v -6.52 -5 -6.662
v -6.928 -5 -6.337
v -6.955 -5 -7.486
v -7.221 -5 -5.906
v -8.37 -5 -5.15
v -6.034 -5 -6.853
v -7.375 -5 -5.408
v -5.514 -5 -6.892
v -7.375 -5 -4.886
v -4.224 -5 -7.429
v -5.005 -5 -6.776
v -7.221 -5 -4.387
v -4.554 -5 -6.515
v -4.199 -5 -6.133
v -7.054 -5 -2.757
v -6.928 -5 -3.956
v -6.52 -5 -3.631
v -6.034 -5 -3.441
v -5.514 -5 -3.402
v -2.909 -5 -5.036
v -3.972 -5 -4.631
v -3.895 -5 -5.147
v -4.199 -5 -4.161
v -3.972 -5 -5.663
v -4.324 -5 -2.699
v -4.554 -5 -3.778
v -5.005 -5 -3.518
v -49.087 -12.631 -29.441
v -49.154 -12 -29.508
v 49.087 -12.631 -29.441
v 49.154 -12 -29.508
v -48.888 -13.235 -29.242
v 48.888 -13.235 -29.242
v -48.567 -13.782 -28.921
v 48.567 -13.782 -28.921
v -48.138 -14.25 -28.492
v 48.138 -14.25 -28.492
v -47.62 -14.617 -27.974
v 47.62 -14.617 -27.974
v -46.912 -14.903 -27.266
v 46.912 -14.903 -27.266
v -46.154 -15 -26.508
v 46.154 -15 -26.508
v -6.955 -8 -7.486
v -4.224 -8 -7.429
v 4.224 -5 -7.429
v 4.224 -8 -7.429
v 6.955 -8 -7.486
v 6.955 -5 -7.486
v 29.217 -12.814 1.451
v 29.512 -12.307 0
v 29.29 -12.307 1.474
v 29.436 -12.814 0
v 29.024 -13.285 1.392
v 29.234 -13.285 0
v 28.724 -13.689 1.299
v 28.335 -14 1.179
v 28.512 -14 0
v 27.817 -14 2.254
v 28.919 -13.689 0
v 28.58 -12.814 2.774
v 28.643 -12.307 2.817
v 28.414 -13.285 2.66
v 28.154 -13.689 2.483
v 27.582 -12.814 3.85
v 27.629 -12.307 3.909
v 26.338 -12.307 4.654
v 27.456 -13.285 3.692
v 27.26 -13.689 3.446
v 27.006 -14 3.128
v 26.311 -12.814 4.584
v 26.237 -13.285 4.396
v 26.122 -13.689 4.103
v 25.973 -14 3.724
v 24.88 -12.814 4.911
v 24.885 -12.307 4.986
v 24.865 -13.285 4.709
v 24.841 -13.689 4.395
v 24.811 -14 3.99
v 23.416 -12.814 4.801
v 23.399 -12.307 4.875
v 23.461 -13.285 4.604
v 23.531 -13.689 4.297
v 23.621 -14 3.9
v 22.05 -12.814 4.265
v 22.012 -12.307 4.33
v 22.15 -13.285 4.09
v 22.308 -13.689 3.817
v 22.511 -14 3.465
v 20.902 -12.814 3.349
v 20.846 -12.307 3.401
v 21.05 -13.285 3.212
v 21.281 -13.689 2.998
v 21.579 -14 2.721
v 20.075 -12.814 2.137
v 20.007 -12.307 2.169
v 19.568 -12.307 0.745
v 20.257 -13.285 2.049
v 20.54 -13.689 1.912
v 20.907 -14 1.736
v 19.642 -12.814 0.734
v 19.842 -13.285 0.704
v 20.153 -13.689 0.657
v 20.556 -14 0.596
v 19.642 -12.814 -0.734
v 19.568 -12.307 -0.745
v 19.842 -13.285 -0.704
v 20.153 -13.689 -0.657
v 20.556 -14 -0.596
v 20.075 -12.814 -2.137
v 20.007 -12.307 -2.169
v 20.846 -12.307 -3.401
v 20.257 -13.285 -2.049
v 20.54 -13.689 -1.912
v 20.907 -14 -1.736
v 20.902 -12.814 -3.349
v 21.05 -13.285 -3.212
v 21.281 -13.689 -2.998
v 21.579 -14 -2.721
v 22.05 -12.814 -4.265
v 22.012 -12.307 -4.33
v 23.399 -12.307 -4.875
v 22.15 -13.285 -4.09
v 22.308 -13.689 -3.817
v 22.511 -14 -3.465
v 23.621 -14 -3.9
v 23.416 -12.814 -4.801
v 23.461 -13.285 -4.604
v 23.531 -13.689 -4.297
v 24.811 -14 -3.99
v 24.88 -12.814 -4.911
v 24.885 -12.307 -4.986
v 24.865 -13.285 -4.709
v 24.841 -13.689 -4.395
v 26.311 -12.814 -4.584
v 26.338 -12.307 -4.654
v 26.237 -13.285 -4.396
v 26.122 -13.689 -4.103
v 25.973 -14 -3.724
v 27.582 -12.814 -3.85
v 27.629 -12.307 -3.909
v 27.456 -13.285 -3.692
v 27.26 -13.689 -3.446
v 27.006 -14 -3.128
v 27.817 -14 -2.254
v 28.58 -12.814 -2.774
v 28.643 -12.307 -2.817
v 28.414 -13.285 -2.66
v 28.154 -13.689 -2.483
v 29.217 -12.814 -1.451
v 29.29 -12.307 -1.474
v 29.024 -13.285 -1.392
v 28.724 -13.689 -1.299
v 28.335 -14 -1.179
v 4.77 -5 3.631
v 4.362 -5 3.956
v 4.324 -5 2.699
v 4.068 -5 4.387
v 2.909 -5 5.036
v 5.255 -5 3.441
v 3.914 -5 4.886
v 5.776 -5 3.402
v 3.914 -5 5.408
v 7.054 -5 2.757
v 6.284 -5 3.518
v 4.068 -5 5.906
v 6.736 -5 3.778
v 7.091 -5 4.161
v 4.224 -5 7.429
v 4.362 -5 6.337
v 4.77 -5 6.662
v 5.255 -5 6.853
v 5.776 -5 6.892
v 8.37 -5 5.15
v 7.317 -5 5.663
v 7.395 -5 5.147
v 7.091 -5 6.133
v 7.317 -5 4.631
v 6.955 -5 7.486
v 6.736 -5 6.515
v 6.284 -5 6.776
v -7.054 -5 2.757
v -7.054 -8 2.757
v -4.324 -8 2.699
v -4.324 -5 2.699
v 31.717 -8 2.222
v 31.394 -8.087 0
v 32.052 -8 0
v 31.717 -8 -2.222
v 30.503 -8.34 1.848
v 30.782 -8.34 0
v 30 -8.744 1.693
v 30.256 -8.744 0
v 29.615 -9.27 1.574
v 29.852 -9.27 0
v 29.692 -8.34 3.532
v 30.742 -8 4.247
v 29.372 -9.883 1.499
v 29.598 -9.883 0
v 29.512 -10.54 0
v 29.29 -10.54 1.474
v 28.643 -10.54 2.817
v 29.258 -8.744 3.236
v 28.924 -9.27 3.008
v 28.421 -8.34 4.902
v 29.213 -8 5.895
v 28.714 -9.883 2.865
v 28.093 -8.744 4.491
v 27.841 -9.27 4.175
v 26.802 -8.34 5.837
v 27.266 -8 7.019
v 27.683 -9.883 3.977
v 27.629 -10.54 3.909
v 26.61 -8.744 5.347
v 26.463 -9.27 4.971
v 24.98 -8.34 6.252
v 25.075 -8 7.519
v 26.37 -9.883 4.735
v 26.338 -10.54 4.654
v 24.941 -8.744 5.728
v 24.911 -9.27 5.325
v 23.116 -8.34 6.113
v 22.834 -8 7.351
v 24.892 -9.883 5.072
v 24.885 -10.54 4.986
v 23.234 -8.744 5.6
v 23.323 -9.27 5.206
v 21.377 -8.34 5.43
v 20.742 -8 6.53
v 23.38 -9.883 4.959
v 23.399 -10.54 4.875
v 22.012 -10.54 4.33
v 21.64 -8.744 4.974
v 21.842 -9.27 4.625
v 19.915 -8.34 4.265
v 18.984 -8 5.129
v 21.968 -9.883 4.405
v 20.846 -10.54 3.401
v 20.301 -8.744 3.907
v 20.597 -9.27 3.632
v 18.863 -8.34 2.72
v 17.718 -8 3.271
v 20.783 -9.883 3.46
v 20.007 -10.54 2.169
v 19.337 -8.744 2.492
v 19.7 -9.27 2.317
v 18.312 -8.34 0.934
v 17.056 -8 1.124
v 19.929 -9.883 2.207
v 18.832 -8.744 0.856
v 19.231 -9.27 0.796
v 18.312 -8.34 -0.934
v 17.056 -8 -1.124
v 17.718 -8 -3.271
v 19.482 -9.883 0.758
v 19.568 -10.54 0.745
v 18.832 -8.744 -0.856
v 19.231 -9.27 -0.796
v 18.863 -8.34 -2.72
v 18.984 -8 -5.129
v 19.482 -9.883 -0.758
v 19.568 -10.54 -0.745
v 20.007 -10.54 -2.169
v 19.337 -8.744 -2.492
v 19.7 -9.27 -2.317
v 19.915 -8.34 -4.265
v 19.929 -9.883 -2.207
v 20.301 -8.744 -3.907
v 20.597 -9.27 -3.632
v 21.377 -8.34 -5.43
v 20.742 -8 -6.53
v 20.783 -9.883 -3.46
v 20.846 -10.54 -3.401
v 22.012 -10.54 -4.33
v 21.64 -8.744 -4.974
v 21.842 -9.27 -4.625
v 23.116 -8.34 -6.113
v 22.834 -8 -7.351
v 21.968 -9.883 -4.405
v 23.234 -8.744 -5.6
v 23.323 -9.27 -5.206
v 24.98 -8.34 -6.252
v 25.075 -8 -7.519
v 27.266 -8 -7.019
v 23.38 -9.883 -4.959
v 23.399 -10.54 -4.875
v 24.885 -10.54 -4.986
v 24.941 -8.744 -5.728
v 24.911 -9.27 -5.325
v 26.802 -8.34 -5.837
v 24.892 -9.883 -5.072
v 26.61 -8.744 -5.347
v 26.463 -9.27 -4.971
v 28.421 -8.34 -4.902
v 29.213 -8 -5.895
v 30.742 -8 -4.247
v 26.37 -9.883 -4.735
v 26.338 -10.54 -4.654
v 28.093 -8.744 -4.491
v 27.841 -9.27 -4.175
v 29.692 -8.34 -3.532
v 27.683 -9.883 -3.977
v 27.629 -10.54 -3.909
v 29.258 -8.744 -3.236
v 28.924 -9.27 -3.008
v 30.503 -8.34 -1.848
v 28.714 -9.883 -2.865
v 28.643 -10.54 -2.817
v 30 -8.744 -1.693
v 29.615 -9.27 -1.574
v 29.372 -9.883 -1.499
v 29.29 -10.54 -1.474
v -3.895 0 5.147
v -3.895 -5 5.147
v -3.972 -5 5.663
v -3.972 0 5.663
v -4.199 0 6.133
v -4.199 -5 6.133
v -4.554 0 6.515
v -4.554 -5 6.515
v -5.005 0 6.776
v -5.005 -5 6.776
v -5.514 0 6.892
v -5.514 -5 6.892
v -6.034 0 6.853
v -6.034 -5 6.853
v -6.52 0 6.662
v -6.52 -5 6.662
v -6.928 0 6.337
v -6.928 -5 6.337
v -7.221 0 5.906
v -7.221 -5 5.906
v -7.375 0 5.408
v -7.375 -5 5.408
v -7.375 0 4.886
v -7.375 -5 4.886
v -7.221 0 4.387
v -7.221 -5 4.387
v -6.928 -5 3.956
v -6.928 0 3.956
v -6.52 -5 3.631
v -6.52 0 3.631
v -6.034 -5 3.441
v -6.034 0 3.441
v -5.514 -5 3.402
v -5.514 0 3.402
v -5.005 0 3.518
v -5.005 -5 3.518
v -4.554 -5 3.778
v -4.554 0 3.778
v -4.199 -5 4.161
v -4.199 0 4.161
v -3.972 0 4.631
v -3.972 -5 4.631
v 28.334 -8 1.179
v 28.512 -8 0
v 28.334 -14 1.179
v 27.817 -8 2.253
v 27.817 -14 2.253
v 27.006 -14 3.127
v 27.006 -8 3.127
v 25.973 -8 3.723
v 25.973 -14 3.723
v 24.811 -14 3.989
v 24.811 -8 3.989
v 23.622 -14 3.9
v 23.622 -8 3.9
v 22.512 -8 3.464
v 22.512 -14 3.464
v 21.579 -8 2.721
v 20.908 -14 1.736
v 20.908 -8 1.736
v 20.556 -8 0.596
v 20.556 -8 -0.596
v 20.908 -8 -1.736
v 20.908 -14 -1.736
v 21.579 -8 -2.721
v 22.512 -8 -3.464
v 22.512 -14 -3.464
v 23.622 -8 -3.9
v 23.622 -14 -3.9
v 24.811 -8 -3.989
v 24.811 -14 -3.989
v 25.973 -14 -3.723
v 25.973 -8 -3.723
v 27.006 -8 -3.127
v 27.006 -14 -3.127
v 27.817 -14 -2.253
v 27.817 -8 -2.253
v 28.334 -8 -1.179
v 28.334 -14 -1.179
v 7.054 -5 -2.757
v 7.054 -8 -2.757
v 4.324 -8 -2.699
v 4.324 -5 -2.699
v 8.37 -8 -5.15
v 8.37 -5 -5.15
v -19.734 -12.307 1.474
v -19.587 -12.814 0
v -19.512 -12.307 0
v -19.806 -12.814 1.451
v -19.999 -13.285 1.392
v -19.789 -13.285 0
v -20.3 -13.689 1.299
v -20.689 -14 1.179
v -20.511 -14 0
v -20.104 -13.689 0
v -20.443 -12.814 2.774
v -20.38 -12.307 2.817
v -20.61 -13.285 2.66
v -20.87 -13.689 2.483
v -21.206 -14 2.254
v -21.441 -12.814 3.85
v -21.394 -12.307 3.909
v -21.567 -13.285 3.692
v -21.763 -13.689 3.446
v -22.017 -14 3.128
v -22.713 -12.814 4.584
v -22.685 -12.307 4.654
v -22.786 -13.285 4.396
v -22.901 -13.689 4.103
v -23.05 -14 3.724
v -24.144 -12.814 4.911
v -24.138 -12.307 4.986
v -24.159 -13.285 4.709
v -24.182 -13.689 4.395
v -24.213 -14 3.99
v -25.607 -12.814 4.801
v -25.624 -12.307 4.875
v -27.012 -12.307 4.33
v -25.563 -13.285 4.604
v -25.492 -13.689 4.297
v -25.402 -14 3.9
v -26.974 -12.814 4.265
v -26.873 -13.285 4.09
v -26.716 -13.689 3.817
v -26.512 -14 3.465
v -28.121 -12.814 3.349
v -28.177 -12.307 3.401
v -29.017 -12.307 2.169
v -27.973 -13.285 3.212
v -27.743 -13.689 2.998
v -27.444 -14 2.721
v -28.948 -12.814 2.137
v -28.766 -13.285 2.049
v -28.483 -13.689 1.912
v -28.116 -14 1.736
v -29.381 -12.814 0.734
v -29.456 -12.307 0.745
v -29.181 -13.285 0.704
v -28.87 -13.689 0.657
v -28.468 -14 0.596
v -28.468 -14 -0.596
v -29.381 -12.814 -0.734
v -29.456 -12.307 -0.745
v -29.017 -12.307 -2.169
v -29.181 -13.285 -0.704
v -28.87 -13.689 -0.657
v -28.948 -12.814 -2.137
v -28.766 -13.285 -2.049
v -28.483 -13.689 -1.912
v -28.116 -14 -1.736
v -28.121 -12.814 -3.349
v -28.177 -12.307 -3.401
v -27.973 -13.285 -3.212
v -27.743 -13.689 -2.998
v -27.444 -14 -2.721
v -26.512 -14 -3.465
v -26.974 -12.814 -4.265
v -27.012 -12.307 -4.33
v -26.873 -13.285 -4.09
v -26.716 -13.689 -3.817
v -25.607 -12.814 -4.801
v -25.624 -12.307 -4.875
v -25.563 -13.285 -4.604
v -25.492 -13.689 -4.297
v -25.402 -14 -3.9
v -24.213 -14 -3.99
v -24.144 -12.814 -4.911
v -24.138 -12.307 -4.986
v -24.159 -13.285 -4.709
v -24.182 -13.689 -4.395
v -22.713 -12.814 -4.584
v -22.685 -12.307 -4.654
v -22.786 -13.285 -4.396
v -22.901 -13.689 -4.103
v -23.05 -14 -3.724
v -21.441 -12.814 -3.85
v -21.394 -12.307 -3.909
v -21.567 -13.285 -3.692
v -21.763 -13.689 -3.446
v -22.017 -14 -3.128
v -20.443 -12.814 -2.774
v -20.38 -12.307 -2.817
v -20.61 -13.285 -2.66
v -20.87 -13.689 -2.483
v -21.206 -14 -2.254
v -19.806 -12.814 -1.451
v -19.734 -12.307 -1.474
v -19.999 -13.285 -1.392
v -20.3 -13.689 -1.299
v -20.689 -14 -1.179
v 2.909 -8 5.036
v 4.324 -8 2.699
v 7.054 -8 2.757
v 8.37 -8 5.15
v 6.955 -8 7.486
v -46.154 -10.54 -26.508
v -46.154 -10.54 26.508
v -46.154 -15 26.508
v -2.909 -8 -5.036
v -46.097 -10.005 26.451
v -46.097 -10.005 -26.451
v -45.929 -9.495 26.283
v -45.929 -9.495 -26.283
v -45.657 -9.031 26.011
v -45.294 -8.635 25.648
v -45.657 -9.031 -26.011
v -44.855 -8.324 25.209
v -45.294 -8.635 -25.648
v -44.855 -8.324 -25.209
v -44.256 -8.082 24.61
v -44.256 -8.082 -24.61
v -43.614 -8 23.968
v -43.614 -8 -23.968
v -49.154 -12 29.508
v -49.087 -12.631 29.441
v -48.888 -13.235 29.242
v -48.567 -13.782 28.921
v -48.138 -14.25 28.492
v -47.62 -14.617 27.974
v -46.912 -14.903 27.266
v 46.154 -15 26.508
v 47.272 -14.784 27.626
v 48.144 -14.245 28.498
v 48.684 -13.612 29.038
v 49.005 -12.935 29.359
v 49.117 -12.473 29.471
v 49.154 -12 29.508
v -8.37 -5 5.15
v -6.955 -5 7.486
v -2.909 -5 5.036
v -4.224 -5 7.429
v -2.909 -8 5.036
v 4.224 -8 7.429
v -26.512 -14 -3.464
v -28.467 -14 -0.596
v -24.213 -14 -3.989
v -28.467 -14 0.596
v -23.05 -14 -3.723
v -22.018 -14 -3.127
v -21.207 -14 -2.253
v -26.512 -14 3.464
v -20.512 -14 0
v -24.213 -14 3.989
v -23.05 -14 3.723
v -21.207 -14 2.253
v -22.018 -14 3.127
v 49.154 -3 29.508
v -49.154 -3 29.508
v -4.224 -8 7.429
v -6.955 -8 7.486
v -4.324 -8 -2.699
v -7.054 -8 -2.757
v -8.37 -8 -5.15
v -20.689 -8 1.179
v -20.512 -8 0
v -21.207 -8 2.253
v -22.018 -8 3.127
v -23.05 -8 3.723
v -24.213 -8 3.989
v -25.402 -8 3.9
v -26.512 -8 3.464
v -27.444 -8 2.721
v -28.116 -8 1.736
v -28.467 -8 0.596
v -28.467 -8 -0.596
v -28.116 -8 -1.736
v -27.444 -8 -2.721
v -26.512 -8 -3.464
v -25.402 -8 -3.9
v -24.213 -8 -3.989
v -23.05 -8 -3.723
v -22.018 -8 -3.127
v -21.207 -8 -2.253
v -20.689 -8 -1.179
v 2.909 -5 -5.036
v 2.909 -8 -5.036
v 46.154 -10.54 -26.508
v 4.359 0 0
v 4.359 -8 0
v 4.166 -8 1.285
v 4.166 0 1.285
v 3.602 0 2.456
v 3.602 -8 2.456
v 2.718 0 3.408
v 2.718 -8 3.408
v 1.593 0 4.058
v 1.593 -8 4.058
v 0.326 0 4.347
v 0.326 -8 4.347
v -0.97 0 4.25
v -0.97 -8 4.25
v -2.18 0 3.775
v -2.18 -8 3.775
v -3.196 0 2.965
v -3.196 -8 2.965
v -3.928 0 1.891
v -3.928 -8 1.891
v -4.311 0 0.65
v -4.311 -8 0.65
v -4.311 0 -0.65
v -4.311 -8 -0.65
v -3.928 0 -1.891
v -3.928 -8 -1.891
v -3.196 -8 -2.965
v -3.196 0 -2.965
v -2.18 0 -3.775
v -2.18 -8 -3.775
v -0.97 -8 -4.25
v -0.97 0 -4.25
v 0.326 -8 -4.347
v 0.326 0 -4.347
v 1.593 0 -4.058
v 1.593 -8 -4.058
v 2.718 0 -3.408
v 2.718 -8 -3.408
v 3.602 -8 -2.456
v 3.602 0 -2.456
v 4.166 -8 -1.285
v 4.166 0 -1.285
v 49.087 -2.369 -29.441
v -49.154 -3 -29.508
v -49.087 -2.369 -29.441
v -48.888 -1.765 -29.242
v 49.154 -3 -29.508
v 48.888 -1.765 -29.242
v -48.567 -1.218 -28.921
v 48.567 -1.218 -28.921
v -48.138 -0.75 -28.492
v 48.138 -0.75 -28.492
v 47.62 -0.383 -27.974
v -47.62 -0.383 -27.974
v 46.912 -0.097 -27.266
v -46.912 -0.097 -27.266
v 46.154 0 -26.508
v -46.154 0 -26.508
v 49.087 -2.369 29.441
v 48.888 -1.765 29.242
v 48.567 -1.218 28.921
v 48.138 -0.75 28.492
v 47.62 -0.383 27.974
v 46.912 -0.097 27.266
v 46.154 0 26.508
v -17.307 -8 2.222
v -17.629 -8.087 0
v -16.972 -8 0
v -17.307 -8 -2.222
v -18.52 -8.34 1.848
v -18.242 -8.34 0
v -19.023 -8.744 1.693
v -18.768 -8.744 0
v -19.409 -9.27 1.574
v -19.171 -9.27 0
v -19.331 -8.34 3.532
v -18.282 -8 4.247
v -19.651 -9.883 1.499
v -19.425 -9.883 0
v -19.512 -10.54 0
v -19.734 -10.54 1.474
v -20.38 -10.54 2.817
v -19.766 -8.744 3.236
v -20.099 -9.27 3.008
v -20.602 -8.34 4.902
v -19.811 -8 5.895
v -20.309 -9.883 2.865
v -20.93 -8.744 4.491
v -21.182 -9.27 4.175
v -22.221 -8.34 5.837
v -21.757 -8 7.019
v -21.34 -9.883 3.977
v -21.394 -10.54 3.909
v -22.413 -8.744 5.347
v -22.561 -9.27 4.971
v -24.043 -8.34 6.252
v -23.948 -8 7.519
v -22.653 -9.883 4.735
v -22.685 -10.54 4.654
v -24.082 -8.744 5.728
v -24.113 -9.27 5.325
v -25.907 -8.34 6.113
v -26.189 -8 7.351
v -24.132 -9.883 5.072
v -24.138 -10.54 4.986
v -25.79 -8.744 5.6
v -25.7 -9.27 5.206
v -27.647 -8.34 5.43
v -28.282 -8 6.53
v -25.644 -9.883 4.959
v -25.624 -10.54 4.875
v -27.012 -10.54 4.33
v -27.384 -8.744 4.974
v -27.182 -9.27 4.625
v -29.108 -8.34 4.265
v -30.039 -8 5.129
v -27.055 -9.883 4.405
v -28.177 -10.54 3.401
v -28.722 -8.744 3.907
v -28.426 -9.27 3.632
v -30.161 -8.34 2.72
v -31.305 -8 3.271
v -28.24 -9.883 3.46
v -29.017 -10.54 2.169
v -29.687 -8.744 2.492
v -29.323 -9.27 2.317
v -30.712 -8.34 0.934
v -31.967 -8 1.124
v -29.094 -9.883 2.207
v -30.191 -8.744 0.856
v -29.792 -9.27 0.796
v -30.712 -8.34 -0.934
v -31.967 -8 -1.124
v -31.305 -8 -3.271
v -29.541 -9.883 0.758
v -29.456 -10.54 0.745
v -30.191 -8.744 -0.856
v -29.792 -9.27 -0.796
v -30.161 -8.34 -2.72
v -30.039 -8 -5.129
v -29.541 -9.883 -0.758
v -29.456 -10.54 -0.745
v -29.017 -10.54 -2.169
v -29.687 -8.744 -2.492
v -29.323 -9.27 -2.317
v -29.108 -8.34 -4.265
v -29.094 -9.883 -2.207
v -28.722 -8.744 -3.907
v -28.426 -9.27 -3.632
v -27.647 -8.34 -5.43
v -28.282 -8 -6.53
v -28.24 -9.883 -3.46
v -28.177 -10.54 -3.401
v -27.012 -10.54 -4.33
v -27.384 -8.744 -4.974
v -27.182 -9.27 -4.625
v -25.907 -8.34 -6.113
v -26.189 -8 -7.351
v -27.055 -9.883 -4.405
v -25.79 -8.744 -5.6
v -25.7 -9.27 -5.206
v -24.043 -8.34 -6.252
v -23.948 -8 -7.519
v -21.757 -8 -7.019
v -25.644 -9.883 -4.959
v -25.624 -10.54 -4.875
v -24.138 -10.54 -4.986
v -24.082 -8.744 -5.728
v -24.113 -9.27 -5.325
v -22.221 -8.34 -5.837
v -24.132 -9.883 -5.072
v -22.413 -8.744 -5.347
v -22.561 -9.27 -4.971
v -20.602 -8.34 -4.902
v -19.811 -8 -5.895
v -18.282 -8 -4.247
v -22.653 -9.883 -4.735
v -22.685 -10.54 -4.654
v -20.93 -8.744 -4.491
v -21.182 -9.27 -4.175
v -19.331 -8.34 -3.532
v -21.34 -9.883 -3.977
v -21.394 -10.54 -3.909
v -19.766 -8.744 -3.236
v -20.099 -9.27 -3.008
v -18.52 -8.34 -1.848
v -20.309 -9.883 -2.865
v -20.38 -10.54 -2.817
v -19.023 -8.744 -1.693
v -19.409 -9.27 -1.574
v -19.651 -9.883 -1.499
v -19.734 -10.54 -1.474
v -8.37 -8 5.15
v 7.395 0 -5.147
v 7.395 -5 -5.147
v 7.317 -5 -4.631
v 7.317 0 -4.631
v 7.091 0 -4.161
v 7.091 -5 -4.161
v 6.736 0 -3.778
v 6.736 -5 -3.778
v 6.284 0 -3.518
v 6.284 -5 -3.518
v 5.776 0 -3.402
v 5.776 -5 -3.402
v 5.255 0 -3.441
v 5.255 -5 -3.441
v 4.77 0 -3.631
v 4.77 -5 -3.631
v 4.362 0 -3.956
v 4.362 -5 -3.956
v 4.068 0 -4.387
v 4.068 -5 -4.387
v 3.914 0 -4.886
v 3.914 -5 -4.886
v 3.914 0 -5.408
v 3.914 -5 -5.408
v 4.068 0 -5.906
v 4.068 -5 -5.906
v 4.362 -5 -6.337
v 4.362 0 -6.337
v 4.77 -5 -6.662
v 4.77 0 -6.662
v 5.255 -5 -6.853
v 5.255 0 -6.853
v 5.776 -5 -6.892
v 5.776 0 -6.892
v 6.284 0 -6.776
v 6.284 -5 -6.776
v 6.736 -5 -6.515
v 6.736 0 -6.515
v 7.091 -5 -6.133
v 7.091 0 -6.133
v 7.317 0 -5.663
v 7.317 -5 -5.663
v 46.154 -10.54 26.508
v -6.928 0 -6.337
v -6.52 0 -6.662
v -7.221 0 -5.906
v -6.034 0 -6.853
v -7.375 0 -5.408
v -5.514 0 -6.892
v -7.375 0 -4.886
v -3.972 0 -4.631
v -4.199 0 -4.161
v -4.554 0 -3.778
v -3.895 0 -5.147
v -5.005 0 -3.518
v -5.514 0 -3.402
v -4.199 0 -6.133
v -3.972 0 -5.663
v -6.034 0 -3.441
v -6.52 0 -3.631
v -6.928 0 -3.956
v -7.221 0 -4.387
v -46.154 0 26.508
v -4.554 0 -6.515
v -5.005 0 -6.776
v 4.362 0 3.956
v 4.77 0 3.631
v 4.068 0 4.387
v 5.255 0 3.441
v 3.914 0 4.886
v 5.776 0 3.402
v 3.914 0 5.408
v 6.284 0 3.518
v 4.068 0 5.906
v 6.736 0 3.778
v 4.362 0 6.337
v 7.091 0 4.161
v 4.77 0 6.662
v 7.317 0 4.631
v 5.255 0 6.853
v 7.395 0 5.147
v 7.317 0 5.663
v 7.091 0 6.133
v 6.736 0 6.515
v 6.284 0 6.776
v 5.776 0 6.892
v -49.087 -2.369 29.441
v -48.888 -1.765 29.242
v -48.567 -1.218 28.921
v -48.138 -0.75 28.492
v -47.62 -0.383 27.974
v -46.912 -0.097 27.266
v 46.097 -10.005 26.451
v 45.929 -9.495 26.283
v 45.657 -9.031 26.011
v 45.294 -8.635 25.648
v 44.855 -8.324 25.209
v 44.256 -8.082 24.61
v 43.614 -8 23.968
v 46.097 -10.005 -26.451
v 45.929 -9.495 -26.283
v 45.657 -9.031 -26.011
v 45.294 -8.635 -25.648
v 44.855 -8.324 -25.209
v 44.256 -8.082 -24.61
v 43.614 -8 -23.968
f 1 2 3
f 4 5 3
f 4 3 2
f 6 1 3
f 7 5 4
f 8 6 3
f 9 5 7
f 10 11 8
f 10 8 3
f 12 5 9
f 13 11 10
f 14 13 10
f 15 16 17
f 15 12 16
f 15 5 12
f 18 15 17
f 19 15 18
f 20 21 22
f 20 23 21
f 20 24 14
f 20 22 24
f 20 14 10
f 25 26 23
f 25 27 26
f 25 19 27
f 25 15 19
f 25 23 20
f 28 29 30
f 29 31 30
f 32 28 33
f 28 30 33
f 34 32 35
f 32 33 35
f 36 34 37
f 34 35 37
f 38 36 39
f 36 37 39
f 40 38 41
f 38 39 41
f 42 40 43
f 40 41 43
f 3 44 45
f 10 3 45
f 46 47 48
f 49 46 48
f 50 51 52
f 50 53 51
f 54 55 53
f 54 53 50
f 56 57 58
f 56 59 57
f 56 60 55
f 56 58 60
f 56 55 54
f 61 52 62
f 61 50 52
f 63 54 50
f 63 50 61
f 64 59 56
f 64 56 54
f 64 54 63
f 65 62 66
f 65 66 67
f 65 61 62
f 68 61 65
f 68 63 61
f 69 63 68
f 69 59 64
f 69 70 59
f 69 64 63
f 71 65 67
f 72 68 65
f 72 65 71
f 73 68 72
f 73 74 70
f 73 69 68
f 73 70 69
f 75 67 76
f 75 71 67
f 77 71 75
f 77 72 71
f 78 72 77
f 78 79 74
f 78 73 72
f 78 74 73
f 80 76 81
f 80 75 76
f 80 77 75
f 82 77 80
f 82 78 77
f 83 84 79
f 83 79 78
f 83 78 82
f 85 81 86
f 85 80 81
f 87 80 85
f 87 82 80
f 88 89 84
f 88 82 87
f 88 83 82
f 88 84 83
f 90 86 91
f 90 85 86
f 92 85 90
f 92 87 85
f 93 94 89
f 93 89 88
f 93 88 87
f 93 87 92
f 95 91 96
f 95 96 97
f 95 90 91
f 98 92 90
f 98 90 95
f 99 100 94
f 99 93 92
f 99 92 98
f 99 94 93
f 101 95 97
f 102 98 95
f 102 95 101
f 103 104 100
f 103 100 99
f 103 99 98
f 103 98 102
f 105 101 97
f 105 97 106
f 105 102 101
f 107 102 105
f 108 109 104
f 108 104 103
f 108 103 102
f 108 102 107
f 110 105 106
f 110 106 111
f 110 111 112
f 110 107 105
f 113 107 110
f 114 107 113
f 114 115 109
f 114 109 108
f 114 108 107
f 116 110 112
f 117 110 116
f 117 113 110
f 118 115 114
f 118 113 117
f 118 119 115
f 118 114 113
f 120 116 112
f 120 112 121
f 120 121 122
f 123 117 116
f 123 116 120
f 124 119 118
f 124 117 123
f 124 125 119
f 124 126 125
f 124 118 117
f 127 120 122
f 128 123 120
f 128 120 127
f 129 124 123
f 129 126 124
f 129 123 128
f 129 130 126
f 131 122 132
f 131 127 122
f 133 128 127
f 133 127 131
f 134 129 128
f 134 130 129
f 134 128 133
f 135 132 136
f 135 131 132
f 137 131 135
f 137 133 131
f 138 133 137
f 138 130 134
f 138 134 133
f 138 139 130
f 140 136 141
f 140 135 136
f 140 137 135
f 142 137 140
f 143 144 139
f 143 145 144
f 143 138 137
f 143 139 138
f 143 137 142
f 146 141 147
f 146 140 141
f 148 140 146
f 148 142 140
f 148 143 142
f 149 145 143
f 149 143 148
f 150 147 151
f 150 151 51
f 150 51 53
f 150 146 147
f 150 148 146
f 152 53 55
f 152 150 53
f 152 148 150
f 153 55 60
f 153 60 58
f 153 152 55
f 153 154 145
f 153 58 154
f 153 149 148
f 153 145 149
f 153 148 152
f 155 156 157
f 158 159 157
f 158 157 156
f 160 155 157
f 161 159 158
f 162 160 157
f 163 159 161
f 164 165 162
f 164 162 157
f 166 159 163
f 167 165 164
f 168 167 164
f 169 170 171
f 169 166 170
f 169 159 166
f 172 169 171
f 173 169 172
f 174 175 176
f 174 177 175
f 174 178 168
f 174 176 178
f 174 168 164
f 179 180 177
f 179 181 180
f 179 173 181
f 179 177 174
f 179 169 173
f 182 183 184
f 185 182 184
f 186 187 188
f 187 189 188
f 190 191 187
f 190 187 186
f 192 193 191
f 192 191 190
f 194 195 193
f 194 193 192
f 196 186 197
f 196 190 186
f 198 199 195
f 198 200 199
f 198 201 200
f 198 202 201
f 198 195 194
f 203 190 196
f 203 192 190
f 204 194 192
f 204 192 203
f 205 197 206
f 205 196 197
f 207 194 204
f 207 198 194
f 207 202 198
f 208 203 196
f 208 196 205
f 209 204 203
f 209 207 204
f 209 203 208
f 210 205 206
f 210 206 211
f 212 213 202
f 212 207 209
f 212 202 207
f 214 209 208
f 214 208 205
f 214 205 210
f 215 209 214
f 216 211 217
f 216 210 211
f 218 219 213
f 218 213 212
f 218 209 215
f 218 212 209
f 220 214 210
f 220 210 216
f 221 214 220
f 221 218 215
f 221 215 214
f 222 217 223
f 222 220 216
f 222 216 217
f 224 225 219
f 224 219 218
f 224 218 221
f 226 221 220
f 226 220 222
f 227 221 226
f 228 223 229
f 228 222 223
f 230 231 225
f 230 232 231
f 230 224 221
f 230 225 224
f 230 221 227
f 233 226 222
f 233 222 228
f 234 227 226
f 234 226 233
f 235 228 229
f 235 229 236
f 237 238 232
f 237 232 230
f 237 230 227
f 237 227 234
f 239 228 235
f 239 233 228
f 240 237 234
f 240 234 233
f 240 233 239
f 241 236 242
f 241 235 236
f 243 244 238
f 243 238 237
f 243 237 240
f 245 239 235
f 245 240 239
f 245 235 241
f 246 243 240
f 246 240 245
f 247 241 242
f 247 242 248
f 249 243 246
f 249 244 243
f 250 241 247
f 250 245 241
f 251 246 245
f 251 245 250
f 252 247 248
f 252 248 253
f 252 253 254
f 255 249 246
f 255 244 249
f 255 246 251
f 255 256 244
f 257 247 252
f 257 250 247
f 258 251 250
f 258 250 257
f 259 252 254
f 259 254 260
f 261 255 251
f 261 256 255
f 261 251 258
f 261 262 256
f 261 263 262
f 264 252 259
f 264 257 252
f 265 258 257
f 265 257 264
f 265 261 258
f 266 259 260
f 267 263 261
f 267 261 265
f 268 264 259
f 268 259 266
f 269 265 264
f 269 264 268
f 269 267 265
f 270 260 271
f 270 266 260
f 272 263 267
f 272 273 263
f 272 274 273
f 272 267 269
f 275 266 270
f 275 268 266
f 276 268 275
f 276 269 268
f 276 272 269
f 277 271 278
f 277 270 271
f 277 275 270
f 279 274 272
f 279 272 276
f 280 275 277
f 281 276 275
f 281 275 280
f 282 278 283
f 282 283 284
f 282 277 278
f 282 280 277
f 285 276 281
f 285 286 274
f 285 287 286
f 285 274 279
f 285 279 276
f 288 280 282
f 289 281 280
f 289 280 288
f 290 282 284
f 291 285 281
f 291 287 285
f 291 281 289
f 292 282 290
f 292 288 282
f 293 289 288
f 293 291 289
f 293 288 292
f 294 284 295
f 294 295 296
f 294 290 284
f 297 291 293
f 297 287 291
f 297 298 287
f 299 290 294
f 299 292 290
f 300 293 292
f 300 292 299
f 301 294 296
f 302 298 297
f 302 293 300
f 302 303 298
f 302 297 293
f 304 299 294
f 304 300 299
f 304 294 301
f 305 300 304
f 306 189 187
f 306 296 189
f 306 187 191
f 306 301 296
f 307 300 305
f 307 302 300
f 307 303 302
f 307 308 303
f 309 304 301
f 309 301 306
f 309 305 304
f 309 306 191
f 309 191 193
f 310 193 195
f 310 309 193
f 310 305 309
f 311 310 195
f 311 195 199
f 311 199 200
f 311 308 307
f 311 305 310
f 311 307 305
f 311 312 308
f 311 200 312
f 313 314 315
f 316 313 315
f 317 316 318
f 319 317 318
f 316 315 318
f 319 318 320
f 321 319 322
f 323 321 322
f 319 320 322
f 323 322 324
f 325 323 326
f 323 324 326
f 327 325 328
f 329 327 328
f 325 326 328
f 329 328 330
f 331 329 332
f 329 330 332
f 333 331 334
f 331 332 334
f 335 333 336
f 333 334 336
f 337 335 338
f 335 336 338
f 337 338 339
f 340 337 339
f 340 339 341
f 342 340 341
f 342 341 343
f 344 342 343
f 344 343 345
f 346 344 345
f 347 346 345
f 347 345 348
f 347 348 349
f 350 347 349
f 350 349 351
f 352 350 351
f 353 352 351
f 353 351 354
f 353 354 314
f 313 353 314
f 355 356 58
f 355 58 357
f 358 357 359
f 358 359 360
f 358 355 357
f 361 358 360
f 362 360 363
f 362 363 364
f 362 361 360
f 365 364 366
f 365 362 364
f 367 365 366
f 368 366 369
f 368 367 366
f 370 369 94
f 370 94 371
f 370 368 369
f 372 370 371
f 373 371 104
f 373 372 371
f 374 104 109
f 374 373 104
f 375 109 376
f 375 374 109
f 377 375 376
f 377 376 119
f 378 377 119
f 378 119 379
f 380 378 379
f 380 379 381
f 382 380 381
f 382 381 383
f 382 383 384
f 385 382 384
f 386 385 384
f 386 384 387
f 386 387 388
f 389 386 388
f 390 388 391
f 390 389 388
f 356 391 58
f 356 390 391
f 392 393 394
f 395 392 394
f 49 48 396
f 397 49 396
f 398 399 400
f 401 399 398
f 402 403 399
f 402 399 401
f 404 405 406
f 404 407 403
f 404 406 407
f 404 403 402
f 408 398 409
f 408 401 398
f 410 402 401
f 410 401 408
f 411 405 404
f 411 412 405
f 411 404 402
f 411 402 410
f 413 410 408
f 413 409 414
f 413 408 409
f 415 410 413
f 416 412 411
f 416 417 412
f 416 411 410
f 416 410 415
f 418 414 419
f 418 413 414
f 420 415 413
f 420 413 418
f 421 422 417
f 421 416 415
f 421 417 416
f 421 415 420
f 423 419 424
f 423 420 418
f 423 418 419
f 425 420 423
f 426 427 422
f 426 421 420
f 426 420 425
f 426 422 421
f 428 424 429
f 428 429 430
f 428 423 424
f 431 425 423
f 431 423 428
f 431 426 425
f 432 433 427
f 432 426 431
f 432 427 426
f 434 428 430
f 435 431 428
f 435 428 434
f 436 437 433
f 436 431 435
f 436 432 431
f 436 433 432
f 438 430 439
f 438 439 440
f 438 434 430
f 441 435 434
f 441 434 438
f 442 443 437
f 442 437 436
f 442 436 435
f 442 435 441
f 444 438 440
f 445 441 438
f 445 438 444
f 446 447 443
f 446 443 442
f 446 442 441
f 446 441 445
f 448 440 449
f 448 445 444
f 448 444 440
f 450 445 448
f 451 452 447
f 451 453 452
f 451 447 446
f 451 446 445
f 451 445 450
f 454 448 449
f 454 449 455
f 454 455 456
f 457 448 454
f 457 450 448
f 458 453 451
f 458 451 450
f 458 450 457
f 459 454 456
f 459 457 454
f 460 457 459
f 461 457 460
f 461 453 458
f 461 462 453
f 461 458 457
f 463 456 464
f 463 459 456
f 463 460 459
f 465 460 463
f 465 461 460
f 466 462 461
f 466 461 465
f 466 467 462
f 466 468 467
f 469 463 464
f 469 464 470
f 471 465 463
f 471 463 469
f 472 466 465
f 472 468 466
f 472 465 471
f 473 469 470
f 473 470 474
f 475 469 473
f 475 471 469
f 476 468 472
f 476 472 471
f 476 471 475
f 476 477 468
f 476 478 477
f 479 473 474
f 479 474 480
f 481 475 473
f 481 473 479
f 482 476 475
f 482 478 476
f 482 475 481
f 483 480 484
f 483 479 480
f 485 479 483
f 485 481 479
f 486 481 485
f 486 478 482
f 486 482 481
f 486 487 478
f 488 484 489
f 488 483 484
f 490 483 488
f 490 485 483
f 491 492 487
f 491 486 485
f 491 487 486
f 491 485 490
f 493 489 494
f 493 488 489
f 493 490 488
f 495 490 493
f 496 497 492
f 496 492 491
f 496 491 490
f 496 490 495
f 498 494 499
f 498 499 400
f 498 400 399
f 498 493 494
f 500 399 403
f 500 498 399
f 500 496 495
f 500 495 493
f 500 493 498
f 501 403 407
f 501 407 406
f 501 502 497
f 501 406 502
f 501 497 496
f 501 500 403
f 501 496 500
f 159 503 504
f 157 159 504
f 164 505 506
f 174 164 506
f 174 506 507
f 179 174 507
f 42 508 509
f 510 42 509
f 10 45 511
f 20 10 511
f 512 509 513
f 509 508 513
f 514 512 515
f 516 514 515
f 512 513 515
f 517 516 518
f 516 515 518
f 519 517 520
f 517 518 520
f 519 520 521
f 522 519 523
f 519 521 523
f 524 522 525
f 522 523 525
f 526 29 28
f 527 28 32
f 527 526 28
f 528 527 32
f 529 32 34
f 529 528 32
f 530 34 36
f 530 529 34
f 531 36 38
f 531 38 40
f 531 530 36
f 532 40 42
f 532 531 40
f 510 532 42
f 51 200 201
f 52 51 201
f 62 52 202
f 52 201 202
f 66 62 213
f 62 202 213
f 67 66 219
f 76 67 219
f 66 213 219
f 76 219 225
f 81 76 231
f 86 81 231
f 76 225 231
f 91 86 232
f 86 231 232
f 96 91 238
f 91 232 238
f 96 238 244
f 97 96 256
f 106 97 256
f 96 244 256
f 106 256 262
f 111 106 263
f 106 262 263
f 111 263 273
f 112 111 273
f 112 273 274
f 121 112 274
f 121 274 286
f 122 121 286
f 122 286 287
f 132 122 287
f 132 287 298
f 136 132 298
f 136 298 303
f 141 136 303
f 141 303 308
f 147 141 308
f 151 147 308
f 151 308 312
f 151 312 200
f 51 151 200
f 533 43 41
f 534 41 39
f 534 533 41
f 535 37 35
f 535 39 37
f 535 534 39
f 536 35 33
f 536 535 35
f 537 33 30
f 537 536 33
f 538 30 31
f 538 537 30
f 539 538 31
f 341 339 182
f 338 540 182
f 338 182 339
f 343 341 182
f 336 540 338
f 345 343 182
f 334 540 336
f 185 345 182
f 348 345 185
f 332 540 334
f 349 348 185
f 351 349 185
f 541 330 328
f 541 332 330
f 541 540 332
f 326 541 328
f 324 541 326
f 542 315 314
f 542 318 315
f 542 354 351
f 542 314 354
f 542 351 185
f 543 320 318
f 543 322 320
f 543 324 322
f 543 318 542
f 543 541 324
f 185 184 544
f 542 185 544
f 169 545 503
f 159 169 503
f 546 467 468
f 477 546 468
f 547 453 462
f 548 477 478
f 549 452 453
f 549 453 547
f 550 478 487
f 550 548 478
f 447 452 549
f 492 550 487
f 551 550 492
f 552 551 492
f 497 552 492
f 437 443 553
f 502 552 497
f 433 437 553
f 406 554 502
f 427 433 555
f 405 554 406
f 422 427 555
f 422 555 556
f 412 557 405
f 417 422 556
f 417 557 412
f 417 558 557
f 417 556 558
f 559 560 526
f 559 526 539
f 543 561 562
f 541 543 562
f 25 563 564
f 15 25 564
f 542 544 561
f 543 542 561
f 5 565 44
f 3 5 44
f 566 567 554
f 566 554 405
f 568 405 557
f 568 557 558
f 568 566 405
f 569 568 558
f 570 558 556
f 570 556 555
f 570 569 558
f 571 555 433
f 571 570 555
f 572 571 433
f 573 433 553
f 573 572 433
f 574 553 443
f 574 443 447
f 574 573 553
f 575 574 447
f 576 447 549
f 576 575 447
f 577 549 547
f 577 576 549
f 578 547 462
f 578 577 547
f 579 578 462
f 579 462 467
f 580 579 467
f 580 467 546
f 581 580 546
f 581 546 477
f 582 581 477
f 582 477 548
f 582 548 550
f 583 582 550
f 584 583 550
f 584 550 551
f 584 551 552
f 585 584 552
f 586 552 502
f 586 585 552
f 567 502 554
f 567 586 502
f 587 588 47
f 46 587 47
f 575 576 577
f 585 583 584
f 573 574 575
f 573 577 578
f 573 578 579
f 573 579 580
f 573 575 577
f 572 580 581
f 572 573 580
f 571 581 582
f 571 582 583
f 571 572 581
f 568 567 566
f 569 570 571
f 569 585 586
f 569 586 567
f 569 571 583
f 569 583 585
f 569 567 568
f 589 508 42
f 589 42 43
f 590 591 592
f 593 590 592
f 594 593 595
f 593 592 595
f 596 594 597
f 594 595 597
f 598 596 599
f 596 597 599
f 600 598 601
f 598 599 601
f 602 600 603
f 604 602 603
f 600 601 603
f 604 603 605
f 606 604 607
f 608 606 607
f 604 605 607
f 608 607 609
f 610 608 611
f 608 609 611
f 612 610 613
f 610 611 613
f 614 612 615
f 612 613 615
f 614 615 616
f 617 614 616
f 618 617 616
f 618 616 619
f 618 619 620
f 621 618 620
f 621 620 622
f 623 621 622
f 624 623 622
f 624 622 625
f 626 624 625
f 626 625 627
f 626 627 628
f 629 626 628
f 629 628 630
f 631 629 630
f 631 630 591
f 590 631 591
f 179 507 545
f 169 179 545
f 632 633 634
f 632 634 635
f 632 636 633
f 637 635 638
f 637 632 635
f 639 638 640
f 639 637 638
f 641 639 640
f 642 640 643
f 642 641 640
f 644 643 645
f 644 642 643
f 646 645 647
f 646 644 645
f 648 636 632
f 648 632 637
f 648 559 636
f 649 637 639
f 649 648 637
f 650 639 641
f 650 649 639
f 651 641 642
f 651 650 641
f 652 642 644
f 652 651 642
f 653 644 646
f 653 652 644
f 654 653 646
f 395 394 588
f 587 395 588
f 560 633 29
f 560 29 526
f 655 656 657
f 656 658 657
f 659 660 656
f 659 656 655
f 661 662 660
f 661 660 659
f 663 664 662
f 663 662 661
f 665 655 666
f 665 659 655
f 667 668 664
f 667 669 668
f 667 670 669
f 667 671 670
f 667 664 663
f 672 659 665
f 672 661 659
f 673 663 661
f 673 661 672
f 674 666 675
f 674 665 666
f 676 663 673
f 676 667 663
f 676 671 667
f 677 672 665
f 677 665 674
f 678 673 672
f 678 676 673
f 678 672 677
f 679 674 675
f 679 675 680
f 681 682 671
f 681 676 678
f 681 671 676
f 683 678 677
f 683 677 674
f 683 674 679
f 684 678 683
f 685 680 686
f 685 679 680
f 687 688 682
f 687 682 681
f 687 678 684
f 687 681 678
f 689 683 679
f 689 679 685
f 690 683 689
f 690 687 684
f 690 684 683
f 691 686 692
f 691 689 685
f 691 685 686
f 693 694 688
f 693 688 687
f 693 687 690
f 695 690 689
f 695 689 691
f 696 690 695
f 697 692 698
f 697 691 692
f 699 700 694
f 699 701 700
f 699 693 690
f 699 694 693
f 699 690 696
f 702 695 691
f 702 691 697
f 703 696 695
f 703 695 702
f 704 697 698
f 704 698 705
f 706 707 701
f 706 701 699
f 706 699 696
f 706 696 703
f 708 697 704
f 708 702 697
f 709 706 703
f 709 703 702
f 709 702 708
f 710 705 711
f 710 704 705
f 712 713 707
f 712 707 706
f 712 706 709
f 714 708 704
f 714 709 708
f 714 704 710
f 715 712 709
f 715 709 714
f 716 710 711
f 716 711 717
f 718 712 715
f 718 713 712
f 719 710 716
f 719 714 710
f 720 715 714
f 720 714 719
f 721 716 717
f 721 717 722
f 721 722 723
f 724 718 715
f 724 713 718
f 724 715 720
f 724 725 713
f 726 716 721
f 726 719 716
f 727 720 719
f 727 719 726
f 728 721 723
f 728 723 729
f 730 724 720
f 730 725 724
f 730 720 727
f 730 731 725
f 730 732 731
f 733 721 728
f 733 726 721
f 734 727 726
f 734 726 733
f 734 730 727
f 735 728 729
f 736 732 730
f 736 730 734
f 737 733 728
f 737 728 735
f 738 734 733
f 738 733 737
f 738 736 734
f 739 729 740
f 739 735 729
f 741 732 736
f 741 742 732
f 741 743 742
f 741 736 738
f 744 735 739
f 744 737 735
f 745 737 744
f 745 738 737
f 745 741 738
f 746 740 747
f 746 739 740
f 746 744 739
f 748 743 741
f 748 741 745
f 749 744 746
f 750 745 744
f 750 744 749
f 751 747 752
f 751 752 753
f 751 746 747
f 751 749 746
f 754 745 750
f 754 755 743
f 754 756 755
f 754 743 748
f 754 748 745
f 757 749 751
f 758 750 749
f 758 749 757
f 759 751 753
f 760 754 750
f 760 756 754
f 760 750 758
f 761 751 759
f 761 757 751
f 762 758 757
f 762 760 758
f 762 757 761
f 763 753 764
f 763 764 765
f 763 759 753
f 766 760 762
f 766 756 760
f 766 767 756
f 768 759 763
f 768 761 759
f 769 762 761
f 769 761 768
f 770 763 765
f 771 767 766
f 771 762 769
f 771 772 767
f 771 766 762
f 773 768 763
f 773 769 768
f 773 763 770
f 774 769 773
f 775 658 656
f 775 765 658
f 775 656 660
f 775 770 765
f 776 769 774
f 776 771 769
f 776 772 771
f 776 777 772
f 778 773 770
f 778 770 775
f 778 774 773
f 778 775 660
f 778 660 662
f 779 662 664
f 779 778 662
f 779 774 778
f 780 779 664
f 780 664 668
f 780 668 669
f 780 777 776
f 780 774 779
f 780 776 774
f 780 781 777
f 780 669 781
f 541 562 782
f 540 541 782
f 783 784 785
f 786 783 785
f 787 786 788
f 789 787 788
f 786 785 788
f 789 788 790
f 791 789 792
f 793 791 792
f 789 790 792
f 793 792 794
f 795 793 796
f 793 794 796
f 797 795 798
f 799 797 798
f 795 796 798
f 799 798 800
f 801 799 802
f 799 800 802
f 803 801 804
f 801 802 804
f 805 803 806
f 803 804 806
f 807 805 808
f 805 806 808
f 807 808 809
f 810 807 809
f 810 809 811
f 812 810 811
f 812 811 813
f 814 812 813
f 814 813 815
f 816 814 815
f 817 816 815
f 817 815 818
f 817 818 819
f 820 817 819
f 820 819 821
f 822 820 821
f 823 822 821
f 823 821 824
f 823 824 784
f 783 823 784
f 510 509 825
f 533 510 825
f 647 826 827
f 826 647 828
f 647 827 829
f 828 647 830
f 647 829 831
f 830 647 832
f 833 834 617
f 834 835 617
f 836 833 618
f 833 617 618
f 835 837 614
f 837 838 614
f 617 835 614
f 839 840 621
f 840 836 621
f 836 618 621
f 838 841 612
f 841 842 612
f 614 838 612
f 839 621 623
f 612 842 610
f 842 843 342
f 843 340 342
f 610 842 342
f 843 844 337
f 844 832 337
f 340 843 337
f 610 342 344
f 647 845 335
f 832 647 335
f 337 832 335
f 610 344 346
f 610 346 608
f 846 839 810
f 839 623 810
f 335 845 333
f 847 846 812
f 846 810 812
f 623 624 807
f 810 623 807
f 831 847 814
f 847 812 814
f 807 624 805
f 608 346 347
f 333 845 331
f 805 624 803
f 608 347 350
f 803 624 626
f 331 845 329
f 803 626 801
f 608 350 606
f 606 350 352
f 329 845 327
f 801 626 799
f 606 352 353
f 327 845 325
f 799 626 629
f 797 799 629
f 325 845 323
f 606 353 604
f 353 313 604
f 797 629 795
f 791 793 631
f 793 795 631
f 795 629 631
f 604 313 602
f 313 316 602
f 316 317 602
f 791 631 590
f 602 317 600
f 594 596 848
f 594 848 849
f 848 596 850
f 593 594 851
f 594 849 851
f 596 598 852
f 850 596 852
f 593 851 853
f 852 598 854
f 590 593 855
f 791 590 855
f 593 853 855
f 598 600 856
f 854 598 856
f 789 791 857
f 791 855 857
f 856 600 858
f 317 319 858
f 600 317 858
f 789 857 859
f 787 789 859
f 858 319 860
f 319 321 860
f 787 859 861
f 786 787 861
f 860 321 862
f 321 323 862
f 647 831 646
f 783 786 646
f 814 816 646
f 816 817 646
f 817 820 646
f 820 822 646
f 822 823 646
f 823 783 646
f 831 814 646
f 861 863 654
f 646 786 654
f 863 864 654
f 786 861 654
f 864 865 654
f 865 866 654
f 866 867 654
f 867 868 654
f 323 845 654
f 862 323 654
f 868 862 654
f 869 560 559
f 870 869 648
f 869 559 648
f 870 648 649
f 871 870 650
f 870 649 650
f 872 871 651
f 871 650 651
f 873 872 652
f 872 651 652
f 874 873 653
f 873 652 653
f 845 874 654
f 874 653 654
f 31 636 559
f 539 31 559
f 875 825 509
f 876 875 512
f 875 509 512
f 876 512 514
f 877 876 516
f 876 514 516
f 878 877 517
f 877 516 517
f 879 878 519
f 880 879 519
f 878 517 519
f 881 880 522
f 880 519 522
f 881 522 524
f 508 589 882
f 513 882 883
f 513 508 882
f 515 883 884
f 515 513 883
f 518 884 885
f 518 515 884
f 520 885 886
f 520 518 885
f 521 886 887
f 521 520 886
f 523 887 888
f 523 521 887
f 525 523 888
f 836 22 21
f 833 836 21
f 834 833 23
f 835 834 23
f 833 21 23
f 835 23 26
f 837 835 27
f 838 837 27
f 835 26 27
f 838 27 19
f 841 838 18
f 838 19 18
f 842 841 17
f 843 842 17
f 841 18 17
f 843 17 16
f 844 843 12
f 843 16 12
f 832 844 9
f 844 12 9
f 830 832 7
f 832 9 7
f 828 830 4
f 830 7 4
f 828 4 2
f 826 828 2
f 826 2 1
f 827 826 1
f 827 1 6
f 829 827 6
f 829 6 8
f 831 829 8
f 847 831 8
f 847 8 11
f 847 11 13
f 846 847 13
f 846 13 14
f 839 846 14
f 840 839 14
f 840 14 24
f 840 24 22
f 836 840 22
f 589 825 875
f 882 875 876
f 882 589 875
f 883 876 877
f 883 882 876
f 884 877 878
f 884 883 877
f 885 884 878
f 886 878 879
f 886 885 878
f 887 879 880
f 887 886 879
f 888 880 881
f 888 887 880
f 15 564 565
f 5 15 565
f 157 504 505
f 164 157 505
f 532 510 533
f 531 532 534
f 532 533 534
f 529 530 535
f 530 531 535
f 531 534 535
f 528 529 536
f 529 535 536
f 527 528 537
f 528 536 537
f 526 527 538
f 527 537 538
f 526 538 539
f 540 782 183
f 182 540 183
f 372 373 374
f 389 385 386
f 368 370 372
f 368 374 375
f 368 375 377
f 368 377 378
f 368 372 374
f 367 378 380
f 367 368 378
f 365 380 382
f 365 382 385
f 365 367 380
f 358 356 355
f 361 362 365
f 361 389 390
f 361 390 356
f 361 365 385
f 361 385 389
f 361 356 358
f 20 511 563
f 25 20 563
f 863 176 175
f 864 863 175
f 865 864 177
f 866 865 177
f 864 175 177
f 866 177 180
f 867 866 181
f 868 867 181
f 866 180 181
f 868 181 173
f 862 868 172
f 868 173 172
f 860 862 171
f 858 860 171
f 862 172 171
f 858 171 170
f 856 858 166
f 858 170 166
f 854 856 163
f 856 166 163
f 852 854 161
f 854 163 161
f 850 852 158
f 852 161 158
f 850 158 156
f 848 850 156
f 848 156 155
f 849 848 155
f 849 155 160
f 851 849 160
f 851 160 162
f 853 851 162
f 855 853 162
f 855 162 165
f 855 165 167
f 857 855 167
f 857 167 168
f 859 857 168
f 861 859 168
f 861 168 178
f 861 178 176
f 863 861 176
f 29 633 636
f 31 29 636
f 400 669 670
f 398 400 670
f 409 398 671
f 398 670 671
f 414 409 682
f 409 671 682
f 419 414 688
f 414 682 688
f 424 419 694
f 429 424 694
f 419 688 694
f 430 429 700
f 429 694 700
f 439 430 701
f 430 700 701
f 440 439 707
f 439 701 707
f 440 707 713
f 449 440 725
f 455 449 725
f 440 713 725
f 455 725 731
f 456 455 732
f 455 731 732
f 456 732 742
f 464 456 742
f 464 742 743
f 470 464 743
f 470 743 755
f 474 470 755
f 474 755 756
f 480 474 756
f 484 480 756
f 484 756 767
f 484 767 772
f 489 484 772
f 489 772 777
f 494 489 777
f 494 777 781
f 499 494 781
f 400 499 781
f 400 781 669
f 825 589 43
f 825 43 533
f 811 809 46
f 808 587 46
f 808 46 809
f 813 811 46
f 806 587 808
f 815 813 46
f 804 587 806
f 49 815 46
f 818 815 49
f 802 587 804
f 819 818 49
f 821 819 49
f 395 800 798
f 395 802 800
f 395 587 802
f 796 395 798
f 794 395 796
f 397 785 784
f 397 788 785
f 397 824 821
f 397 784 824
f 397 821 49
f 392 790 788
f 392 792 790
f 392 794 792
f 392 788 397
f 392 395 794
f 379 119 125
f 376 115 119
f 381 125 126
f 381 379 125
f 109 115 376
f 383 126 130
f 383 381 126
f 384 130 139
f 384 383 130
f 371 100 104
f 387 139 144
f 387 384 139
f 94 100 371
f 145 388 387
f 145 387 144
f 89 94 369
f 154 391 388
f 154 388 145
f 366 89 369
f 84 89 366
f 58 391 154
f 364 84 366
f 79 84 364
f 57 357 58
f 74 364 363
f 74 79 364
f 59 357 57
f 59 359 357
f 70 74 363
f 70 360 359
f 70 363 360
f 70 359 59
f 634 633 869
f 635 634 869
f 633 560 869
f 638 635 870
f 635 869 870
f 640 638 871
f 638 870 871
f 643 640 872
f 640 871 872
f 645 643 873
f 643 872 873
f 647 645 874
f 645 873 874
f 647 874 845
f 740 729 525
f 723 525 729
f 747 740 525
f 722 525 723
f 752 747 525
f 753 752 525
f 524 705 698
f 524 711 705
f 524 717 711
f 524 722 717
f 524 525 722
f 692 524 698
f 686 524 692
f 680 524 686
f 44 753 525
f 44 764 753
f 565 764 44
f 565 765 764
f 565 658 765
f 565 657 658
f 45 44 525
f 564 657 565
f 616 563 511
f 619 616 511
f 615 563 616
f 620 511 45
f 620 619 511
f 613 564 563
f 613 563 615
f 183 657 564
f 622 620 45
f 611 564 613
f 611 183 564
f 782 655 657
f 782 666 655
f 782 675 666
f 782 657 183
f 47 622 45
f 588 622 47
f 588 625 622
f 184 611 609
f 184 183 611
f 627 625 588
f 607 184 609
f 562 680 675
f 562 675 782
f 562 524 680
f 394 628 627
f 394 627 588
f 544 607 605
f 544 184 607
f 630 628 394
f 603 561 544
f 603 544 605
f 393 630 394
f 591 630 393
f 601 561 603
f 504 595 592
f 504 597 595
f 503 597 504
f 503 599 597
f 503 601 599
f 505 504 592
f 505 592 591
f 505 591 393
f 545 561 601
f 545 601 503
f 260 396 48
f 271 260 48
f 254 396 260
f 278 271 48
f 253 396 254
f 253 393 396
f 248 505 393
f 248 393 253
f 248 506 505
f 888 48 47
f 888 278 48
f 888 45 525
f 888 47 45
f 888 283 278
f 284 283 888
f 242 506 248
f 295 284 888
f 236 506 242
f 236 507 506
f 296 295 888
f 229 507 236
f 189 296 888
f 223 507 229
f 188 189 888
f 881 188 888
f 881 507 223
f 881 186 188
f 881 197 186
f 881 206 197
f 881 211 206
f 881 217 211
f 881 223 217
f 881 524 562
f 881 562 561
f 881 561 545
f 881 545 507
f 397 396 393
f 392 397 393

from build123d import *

# Parameters (mm, degrees)
F0_W     = 98.3085063696
F0_H     = 59.0165173113
F0_W_2   = 92.3085063696
F0_H_2   = 53.0165173113
F1_DEPTH = 8
F2_DEPTH = 15
F3_R     = 4.3592981544
F3_R_2   = 1.7500302992
F4_DEPTH = 8.001
F3_R_3   = 5
F3_R_4   = 4
F5_DEPTH = 6
F6_R     = 2.54
F7_R     = 1.7500302992
F8_DEPTH = 3
F9_R     = 3
F10_R    = 2.99999


# Not quite as in the source:
# - a fillet or chamfer that OpenCascade refuses, or shapes differently, is made with other operations: its cross-section is extruded or revolved along the edge and cut away or added
# - a fillet or chamfer is up to 0.001 mm smaller than in the source, because OpenCascade refuses the exact size


with BuildPart() as f1:
    # F0 (on Front) → F1 (new body)
    with BuildSketch(Plane.XZ):
        Rectangle(F0_W, F0_H)
        Rectangle(F0_W_2, F0_H_2, mode=Mode.SUBTRACT)
        Rectangle(F0_W_2, F0_H_2)
    extrude(amount=F1_DEPTH)

    # F0 (on Front) → F2 (join)
    with BuildSketch(Plane.XZ):
        Rectangle(F0_W, F0_H)
        Rectangle(F0_W_2, F0_H_2, mode=Mode.SUBTRACT)
    extrude(amount=F2_DEPTH)

    # F3 (on face) → F4 (cut, through all)
    with BuildSketch(Plane.XZ.offset(8)):
        Circle(F3_R)
        with Locations((5.6447647512, 5.1466971636)):
            Circle(F3_R_2)
        with Locations((-5.6447647512, 5.1466971636)):
            Circle(F3_R_2)
        with Locations((-5.6447647512, -5.1466971636)):
            Circle(F3_R_2)
        with Locations((5.6447647512, -5.1466971636)):
            Circle(F3_R_2)
    extrude(amount=-F4_DEPTH, mode=Mode.SUBTRACT)

    # F3 (on face) → F5 (join)
    with BuildSketch(Plane.XZ.offset(8)):
        with Locations((-24.5116613805, 0)):
            Circle(F3_R_3)
        with Locations((-24.5116613805, 0)):
            Circle(F3_R_4, mode=Mode.SUBTRACT)
        with Locations((24.5116613805, 0)):
            Circle(F3_R_3)
        with Locations((24.5116613805, 0)):
            Circle(F3_R_4, mode=Mode.SUBTRACT)
    extrude(amount=F5_DEPTH)

    # F6
    f6_edges = [f1.edges().sort_by_distance(p)[0] for p in [
        (-29.511661, -8, 0),
        (19.511661, -8, 0),
        (0, -8, -26.508259),
        (46.154253, -8, 0),
        (-46.154253, -8, 0),
        (0, -8, 26.508259),
    ]]
    fillet(f6_edges, radius=F6_R)

    # F7 (on face) → F8 (cut)
    with BuildSketch(Plane.XZ.offset(8)):
        Polygon((-2.9085768434, 5.0357150996), (-4.2244093493, 7.4292570353), (-6.9551937235, 7.4864836259), (-8.3701455918, 5.1501682809), (-7.054313086, 2.7566263452), (-4.3235287118, 2.6993997546), align=None)
        with Locations((-5.6447647512, 5.1466971636)):
            Circle(F7_R, mode=Mode.SUBTRACT)
        Polygon((8.3701455918, 5.1501682809), (6.9551937235, 7.4864836259), (4.2244093493, 7.4292570353), (2.9085768434, 5.0357150996), (4.3235287118, 2.6993997546), (7.054313086, 2.7566263452), align=None)
        with Locations((5.6447647512, 5.1466971636)):
            Circle(F7_R, mode=Mode.SUBTRACT)
        Polygon((4.3235287118, -2.6993997546), (2.9085768434, -5.0357150996), (4.2244093493, -7.4292570353), (6.9551937235, -7.4864836259), (8.3701455918, -5.1501682809), (7.054313086, -2.7566263452), align=None)
        with Locations((5.6447647512, -5.1466971636)):
            Circle(F7_R, mode=Mode.SUBTRACT)
        Polygon((-2.9085768434, -5.0357150996), (-4.3235287118, -2.6993997546), (-7.054313086, -2.7566263452), (-8.3701455918, -5.1501682809), (-6.9551937235, -7.4864836259), (-4.2244093493, -7.4292570353), align=None)
        with Locations((-5.6447647512, -5.1466971636)):
            Circle(F7_R, mode=Mode.SUBTRACT)
    extrude(amount=-F8_DEPTH, mode=Mode.SUBTRACT)

    # F9
    f9_edges = [f1.edges().sort_by_distance(p)[0] for p in [
        (0, 0, 29.508259),
        (49.154253, 0, 0),
        (0, 0, -29.508259),
        (-49.154253, 0, 0),
    ]]
    fillet(f9_edges, radius=F9_R)

    # F10 (radius 3 in the source; OpenCascade refuses exactly that, so slightly less here)
    f10_edges = [f1.edges().sort_by_distance(p)[0] for p in [
        (0, -15, -29.508259),
        (49.154253, -15, 0),
        (-49.154253, -15, 0),
        (0, -15, 29.508259),
    ]]
    fillet(f10_edges, radius=F10_R)

    # F11: fillet of radius 2 on 2 edges, made by hand

    # F11_s1 → F11_t2 (revolve, cut)
    with BuildSketch(Plane.XY):
        with BuildLine():
            ThreePointArc((29.5120613805, -12.2673917434), (29.2440686279, -13.2678330874), (28.5118614771, -14.0003463544))
            Line((28.5118614771, -14.0003463544), (28.6119780552, -14.1736418155))
            ThreePointArc((28.6119780552, -14.1736418155), (29.0117614288, -14.2001365685), (29.5116613805, -14.2001365685))
            Line((29.5116613805, -14.2001365685), (29.7117979491, -14))
            ThreePointArc((29.7117979491, -14), (29.7117979491, -13.1336958717), (29.7121979491, -12.2673917434))
            Line((29.7121979491, -12.2673917434), (29.5120613805, -12.2673917434))
        make_face()
    revolve(axis=Axis((24.5116613805, -14, 0), (0, -1, 0)), mode=Mode.SUBTRACT)

    # F11_s3 → F11_t4 (revolve, cut)
    with BuildSketch(Plane.XY):
        with BuildLine():
            ThreePointArc((-19.5112613805, -12.2673917434), (-19.7792541332, -13.2678330874), (-20.511461284, -14.0003463544))
            Line((-20.511461284, -14.0003463544), (-20.4113447058, -14.1736418155))
            ThreePointArc((-20.4113447058, -14.1736418155), (-20.0115613323, -14.2001365685), (-19.5116613805, -14.2001365685))
            Line((-19.5116613805, -14.2001365685), (-19.311524812, -14))
            ThreePointArc((-19.311524812, -14), (-19.311524812, -13.1336958717), (-19.311124812, -12.2673917434))
            Line((-19.311124812, -12.2673917434), (-19.5112613805, -12.2673917434))
        make_face()
    revolve(axis=Axis((-24.5116613805, -14, 0), (0, -1, 0)), mode=Mode.SUBTRACT)


solid = f1.part
